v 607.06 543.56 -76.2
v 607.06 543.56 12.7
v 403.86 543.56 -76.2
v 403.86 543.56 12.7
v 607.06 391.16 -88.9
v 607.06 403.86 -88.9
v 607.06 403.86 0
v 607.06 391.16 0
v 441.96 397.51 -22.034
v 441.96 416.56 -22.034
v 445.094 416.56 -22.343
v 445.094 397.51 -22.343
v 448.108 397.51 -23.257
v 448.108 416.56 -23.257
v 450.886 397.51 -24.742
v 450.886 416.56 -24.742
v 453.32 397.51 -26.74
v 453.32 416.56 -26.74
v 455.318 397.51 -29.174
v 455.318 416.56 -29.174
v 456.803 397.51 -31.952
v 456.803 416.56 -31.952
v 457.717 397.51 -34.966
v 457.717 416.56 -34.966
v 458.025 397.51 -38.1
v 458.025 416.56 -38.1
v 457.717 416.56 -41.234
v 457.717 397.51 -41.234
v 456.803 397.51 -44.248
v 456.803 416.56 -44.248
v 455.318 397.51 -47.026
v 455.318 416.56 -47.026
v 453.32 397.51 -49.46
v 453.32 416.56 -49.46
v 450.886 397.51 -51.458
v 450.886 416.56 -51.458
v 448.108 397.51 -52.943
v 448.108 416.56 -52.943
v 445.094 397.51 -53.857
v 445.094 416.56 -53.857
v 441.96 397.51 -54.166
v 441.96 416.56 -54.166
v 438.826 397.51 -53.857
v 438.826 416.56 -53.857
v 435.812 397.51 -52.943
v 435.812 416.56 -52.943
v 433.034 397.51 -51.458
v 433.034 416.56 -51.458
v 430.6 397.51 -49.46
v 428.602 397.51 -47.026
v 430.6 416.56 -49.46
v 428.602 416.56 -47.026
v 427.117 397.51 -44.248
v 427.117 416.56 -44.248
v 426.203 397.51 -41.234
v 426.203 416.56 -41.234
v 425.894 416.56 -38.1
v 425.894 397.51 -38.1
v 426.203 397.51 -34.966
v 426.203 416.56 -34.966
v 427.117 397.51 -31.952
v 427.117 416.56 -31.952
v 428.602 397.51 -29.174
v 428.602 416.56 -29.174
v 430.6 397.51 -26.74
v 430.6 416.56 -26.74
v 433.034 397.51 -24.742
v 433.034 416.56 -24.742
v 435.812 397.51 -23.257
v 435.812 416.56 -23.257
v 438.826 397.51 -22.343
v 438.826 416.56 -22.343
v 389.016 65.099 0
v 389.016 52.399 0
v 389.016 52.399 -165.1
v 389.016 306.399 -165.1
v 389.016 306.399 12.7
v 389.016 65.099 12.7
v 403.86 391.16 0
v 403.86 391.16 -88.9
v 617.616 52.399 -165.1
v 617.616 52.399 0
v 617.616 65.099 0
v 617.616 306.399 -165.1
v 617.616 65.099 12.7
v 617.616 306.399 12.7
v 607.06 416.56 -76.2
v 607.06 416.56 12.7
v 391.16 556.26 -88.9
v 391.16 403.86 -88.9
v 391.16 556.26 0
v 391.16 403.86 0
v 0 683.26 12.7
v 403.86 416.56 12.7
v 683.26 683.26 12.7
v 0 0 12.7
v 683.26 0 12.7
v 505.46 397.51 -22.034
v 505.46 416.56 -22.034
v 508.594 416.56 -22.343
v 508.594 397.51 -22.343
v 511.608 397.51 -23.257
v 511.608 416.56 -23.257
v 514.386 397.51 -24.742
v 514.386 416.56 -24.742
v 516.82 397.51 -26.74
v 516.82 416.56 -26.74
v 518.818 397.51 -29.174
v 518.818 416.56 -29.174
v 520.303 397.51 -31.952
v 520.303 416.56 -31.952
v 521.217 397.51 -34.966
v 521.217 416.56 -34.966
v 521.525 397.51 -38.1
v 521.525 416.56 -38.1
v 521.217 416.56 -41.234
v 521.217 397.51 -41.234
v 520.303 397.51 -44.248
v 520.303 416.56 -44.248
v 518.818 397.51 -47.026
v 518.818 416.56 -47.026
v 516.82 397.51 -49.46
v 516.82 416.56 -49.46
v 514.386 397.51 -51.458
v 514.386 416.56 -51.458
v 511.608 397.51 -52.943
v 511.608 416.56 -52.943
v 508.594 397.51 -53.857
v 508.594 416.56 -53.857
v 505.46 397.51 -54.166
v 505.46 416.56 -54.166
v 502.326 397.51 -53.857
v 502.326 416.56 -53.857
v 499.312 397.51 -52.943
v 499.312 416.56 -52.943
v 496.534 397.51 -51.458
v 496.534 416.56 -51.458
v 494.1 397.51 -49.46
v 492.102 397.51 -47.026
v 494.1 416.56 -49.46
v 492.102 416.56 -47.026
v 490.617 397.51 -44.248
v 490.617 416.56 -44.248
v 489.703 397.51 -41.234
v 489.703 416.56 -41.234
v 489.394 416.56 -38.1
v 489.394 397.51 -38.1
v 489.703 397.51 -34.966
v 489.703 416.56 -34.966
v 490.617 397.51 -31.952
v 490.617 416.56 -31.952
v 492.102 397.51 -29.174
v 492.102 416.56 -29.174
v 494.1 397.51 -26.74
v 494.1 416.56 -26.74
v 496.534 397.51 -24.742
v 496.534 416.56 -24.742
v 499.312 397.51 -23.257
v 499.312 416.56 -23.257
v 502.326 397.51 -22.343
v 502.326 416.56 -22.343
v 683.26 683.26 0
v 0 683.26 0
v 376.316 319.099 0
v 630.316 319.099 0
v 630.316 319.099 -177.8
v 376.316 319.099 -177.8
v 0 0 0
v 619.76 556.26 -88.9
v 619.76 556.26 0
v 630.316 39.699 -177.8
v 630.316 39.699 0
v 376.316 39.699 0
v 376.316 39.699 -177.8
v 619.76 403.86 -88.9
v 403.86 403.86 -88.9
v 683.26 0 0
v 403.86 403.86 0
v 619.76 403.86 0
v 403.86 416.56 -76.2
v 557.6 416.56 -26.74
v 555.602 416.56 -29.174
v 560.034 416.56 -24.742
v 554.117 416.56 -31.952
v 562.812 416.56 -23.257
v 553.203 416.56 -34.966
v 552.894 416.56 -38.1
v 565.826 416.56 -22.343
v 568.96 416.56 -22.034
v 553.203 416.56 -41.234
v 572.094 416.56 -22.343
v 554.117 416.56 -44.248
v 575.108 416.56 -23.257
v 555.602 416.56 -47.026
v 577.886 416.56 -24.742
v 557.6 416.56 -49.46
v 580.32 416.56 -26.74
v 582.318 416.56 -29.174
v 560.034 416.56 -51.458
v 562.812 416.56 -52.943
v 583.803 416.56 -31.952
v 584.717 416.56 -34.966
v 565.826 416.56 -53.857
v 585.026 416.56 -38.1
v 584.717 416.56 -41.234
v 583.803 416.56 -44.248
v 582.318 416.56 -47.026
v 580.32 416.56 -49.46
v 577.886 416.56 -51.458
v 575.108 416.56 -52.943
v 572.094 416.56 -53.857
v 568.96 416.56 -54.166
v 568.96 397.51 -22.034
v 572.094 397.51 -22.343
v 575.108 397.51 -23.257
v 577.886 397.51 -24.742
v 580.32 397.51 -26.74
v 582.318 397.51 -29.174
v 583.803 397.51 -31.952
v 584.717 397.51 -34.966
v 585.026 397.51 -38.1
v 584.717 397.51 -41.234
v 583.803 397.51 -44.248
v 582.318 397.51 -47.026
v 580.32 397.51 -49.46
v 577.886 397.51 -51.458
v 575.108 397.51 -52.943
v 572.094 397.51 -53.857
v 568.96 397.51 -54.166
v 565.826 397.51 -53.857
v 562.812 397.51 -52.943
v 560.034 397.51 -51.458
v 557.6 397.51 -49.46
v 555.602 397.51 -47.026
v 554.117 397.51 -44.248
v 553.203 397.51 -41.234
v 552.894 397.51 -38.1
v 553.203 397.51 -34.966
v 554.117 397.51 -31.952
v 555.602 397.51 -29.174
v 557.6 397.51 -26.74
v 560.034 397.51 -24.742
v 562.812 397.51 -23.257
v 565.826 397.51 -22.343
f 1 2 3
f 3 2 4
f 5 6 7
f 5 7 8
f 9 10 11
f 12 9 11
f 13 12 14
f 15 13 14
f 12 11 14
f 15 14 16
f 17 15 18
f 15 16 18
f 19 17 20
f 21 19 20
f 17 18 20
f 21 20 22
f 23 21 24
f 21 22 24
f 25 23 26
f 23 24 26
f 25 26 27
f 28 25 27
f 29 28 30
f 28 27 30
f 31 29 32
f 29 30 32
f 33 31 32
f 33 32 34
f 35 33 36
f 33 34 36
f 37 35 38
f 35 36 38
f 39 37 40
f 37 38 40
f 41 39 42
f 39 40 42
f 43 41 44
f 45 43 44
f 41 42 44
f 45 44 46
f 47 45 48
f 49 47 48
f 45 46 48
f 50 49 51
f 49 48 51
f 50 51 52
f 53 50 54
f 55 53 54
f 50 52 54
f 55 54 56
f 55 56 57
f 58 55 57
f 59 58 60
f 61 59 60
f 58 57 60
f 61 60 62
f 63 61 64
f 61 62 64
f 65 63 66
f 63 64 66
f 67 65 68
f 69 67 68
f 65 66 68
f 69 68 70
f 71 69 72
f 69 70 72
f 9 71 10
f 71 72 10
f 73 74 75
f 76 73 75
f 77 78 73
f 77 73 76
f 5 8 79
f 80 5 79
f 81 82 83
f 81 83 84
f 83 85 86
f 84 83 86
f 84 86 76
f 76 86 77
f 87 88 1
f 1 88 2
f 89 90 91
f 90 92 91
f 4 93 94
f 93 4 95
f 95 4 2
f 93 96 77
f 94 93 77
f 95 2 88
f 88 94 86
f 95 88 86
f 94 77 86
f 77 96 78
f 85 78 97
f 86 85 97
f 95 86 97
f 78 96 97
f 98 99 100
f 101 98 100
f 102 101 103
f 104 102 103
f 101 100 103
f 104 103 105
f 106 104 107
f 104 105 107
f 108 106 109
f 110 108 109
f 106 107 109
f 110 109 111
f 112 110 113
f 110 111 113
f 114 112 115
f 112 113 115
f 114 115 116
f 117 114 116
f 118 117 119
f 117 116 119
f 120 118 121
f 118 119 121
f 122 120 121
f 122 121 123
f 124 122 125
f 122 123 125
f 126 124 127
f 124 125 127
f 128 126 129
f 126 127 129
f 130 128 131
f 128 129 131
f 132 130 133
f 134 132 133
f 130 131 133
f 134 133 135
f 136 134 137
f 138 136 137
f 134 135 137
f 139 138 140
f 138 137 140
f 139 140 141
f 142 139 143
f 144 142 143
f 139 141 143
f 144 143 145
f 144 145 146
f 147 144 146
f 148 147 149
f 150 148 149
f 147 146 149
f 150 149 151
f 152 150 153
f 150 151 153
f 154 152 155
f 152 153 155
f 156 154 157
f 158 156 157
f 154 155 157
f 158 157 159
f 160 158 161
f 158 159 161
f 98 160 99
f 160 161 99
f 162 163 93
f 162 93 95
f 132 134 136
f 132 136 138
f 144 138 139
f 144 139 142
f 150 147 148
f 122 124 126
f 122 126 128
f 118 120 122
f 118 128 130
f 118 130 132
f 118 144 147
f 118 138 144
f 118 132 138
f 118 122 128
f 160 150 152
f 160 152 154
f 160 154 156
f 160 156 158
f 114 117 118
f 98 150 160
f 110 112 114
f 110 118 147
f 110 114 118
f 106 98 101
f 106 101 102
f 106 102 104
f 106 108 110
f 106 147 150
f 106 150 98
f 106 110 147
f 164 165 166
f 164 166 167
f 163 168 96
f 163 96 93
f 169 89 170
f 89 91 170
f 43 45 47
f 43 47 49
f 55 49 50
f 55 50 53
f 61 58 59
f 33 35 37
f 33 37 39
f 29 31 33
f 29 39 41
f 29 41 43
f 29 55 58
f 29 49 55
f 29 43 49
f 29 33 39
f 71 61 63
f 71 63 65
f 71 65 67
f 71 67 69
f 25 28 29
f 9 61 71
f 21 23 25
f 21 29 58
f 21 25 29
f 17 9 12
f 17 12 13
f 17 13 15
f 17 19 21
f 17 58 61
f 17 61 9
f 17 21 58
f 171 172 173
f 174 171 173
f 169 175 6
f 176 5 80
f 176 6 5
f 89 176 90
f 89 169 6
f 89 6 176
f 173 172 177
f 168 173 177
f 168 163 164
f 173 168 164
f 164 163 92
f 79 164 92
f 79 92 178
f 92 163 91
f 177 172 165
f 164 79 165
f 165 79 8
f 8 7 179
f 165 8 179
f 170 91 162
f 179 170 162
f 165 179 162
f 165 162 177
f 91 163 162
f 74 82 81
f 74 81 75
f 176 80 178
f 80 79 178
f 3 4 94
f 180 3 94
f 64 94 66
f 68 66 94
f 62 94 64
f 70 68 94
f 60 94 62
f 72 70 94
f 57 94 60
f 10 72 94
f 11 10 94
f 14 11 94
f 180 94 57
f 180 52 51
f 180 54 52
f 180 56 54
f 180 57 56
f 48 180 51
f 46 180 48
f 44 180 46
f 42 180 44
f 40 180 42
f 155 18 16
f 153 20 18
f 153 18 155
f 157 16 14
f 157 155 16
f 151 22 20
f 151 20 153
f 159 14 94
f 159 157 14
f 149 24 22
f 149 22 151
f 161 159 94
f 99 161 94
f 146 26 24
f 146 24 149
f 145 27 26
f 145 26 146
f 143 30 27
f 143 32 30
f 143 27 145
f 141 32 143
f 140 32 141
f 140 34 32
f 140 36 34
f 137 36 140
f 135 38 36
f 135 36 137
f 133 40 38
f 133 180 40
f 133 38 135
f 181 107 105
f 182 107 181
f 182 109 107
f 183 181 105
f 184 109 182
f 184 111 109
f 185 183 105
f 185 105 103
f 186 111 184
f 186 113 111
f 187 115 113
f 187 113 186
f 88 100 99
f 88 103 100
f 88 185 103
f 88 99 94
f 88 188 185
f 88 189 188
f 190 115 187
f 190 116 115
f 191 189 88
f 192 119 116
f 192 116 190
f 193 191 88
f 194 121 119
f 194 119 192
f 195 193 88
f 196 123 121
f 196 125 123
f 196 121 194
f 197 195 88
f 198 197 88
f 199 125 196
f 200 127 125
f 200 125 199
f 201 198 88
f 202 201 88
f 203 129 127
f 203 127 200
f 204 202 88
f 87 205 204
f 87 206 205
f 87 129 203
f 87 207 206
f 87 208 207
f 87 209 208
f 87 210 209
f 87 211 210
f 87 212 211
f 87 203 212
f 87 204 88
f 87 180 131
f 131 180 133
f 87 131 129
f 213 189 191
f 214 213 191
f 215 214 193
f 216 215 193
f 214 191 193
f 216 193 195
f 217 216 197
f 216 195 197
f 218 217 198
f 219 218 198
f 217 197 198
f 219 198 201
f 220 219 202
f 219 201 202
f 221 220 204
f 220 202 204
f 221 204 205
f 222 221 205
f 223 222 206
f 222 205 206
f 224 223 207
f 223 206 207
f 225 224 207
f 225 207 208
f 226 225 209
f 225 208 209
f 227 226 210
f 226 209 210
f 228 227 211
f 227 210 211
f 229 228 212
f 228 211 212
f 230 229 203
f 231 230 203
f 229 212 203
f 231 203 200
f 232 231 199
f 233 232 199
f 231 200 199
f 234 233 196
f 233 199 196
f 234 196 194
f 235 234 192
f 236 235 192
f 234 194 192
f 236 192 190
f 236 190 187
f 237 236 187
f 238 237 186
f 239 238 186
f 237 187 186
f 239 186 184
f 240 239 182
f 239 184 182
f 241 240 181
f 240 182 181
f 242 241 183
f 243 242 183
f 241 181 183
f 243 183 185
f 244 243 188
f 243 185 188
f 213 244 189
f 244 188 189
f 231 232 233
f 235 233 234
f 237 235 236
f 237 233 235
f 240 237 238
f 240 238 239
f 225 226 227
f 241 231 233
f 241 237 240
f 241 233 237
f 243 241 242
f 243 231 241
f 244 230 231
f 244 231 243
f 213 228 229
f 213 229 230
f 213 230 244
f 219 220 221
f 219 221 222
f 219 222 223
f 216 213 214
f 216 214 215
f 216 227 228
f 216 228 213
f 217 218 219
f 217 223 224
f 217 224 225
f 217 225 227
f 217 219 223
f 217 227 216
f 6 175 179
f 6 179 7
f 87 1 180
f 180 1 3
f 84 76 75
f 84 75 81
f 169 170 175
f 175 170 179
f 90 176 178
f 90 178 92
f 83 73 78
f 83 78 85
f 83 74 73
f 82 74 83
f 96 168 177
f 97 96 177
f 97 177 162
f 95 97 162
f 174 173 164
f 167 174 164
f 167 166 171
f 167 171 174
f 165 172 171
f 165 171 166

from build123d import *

# Parameters (mm, degrees)
SKETCH1_W           = 683.26
SKETCH1_H           = 683.26
SKETCH1_W_2         = 203.2
SKETCH1_H_2         = 127
BOSS_EXTRUDE1_DEPTH = 12.7
SKETCH2_W           = 203.2
SKETCH2_H           = 76.2
BOSS_EXTRUDE2_DEPTH = 25.4
SKETCH3_R           = 16.0655
CUT_EXTRUDE1_DEPTH  = 19.05
SKETCH4_W           = 12.7
SKETCH4_H           = 12.7
SKETCH4_H_2         = 127
SKETCH4_W_2         = 203.2
BOSS_EXTRUDE4_DEPTH = 76.2
BOSS_EXTRUDE5_DEPTH = 12.7
SKETCH6_W           = 228.6
SKETCH6_H           = 254
CUT_EXTRUDE2_DEPTH  = 972.60229271
SKETCH7_W           = 228.6
SKETCH7_H           = 12.7
BOSS_EXTRUDE6_DEPTH = 177.8
SKETCH8_W           = 12.7
SKETCH8_H           = 279.4
BOSS_EXTRUDE7_DEPTH = 177.8
SKETCH9_W           = 228.6
SKETCH9_H           = 12.7
BOSS_EXTRUDE8_DEPTH = 254
SKETCH10_W          = 228.6
SKETCH10_H          = 12.7
BOSS_EXTRUDE9_DEPTH = 12.7


with BuildPart() as part:
    # Sketch1 → Boss-Extrude1 (new body)
    with BuildSketch(Plane.XY):
        with Locations((341.63, 341.63)):
            Rectangle(SKETCH1_W, SKETCH1_H)
        with Locations((505.46, 480.06)):
            Rectangle(SKETCH1_W_2, SKETCH1_H_2, mode=Mode.SUBTRACT)
    extrude(amount=BOSS_EXTRUDE1_DEPTH)

    # Sketch2 → Boss-Extrude2 (add)
    with BuildSketch(Plane(origin=(0, 416.56, 0), x_dir=(1, 0, 0), z_dir=(0, 1, 0))):
        with Locations((505.46, 38.1)):
            Rectangle(SKETCH2_W, SKETCH2_H)
    extrude(amount=-BOSS_EXTRUDE2_DEPTH)

    # Sketch3 → Cut-Extrude1 (cut)
    with BuildSketch(Plane(origin=(0, 416.56, 0), x_dir=(1, 0, 0), z_dir=(0, 1, 0))):
        with Locations(Location((568.96, 38.1, 0), (0, 0, 270))):
            Circle(SKETCH3_R)
        with Locations(Location((505.46, 38.1, 0), (0, 0, 270))):
            Circle(SKETCH3_R)
        with Locations(Location((441.96, 38.1, 0), (0, 0, 270))):
            Circle(SKETCH3_R)
    extrude(amount=-CUT_EXTRUDE1_DEPTH, mode=Mode.SUBTRACT)

    # Sketch4 → Boss-Extrude4 (add)
    with BuildSketch(Plane(origin=(0, 0, 0), x_dir=(-1, 0, 0), z_dir=(0, 0, -1))):
        with Locations((-613.41, 410.21)):
            Rectangle(SKETCH4_W, SKETCH4_H)
        with Locations((-613.41, 480.06)):
            Rectangle(SKETCH4_W, SKETCH4_H_2)
        with Locations((-505.46, 549.91)):
            Rectangle(SKETCH4_W_2, SKETCH4_H)
        with Locations((-613.41, 549.91)):
            Rectangle(SKETCH4_W, SKETCH4_H)
        with Locations((-397.51, 549.91)):
            Rectangle(SKETCH4_W, SKETCH4_H)
        with Locations((-397.51, 480.06)):
            Rectangle(SKETCH4_W, SKETCH4_H_2)
        with Locations((-397.51, 410.21)):
            Rectangle(SKETCH4_W, SKETCH4_H)
    extrude(amount=BOSS_EXTRUDE4_DEPTH)

    # Sketch5 → Boss-Extrude5 (add)
    with BuildSketch(Plane(origin=(0, 0, -76.2), x_dir=(-1, 0, 0), z_dir=(0, 0, -1))):
        Polygon((-607.06, 391.16), (-403.86, 391.16), (-403.86, 403.86), (-391.16, 403.86), (-391.16, 556.26), (-619.76, 556.26), (-619.76, 403.86), (-607.06, 403.86), align=None)
    extrude(amount=BOSS_EXTRUDE5_DEPTH)

    # Sketch6 → Cut-Extrude2 (cut, through all)
    with BuildSketch(Plane.XY.offset(12.7)):
        with Locations((503.315588228, 179.399098269)):
            Rectangle(SKETCH6_W, SKETCH6_H)
    extrude(amount=-CUT_EXTRUDE2_DEPTH, mode=Mode.SUBTRACT)

    # Sketch7 → Boss-Extrude6 (add)
    with BuildSketch(Plane(origin=(0, 0, 0), x_dir=(-1, 0, 0), z_dir=(0, 0, -1))):
        with Locations((-503.315588228, 46.049098269)):
            Rectangle(SKETCH7_W, SKETCH7_H)
    boss_extrude6 = extrude(amount=BOSS_EXTRUDE6_DEPTH)

    # Mirror1: Boss-Extrude6 across plane
    add(boss_extrude6.mirror(Plane.ZX.offset(179.399098269)))

    # Sketch8 → Boss-Extrude7 (add)
    with BuildSketch(Plane(origin=(0, 0, 0), x_dir=(-1, 0, 0), z_dir=(0, 0, -1))):
        with Locations((-623.965588228, 179.399098269)):
            Rectangle(SKETCH8_W, SKETCH8_H)
        with Locations((-382.665588228, 179.399098269)):
            Rectangle(SKETCH8_W, SKETCH8_H)
    extrude(amount=BOSS_EXTRUDE7_DEPTH)

    # Sketch9 → Boss-Extrude8 (add)
    with BuildSketch(Plane(origin=(0, 52.399098269, 0), x_dir=(1, 0, 0), z_dir=(0, 1, 0))):
        with Locations((503.315588228, 171.45)):
            Rectangle(SKETCH9_W, SKETCH9_H)
    extrude(amount=BOSS_EXTRUDE8_DEPTH)

    # Sketch10 → Boss-Extrude9 (add)
    with BuildSketch(Plane(origin=(0, 52.399098269, 0), x_dir=(1, 0, 0), z_dir=(0, 1, 0))):
        with Locations((503.315588228, -6.35)):
            Rectangle(SKETCH10_W, SKETCH10_H)
    extrude(amount=BOSS_EXTRUDE9_DEPTH)


solid = part.part
